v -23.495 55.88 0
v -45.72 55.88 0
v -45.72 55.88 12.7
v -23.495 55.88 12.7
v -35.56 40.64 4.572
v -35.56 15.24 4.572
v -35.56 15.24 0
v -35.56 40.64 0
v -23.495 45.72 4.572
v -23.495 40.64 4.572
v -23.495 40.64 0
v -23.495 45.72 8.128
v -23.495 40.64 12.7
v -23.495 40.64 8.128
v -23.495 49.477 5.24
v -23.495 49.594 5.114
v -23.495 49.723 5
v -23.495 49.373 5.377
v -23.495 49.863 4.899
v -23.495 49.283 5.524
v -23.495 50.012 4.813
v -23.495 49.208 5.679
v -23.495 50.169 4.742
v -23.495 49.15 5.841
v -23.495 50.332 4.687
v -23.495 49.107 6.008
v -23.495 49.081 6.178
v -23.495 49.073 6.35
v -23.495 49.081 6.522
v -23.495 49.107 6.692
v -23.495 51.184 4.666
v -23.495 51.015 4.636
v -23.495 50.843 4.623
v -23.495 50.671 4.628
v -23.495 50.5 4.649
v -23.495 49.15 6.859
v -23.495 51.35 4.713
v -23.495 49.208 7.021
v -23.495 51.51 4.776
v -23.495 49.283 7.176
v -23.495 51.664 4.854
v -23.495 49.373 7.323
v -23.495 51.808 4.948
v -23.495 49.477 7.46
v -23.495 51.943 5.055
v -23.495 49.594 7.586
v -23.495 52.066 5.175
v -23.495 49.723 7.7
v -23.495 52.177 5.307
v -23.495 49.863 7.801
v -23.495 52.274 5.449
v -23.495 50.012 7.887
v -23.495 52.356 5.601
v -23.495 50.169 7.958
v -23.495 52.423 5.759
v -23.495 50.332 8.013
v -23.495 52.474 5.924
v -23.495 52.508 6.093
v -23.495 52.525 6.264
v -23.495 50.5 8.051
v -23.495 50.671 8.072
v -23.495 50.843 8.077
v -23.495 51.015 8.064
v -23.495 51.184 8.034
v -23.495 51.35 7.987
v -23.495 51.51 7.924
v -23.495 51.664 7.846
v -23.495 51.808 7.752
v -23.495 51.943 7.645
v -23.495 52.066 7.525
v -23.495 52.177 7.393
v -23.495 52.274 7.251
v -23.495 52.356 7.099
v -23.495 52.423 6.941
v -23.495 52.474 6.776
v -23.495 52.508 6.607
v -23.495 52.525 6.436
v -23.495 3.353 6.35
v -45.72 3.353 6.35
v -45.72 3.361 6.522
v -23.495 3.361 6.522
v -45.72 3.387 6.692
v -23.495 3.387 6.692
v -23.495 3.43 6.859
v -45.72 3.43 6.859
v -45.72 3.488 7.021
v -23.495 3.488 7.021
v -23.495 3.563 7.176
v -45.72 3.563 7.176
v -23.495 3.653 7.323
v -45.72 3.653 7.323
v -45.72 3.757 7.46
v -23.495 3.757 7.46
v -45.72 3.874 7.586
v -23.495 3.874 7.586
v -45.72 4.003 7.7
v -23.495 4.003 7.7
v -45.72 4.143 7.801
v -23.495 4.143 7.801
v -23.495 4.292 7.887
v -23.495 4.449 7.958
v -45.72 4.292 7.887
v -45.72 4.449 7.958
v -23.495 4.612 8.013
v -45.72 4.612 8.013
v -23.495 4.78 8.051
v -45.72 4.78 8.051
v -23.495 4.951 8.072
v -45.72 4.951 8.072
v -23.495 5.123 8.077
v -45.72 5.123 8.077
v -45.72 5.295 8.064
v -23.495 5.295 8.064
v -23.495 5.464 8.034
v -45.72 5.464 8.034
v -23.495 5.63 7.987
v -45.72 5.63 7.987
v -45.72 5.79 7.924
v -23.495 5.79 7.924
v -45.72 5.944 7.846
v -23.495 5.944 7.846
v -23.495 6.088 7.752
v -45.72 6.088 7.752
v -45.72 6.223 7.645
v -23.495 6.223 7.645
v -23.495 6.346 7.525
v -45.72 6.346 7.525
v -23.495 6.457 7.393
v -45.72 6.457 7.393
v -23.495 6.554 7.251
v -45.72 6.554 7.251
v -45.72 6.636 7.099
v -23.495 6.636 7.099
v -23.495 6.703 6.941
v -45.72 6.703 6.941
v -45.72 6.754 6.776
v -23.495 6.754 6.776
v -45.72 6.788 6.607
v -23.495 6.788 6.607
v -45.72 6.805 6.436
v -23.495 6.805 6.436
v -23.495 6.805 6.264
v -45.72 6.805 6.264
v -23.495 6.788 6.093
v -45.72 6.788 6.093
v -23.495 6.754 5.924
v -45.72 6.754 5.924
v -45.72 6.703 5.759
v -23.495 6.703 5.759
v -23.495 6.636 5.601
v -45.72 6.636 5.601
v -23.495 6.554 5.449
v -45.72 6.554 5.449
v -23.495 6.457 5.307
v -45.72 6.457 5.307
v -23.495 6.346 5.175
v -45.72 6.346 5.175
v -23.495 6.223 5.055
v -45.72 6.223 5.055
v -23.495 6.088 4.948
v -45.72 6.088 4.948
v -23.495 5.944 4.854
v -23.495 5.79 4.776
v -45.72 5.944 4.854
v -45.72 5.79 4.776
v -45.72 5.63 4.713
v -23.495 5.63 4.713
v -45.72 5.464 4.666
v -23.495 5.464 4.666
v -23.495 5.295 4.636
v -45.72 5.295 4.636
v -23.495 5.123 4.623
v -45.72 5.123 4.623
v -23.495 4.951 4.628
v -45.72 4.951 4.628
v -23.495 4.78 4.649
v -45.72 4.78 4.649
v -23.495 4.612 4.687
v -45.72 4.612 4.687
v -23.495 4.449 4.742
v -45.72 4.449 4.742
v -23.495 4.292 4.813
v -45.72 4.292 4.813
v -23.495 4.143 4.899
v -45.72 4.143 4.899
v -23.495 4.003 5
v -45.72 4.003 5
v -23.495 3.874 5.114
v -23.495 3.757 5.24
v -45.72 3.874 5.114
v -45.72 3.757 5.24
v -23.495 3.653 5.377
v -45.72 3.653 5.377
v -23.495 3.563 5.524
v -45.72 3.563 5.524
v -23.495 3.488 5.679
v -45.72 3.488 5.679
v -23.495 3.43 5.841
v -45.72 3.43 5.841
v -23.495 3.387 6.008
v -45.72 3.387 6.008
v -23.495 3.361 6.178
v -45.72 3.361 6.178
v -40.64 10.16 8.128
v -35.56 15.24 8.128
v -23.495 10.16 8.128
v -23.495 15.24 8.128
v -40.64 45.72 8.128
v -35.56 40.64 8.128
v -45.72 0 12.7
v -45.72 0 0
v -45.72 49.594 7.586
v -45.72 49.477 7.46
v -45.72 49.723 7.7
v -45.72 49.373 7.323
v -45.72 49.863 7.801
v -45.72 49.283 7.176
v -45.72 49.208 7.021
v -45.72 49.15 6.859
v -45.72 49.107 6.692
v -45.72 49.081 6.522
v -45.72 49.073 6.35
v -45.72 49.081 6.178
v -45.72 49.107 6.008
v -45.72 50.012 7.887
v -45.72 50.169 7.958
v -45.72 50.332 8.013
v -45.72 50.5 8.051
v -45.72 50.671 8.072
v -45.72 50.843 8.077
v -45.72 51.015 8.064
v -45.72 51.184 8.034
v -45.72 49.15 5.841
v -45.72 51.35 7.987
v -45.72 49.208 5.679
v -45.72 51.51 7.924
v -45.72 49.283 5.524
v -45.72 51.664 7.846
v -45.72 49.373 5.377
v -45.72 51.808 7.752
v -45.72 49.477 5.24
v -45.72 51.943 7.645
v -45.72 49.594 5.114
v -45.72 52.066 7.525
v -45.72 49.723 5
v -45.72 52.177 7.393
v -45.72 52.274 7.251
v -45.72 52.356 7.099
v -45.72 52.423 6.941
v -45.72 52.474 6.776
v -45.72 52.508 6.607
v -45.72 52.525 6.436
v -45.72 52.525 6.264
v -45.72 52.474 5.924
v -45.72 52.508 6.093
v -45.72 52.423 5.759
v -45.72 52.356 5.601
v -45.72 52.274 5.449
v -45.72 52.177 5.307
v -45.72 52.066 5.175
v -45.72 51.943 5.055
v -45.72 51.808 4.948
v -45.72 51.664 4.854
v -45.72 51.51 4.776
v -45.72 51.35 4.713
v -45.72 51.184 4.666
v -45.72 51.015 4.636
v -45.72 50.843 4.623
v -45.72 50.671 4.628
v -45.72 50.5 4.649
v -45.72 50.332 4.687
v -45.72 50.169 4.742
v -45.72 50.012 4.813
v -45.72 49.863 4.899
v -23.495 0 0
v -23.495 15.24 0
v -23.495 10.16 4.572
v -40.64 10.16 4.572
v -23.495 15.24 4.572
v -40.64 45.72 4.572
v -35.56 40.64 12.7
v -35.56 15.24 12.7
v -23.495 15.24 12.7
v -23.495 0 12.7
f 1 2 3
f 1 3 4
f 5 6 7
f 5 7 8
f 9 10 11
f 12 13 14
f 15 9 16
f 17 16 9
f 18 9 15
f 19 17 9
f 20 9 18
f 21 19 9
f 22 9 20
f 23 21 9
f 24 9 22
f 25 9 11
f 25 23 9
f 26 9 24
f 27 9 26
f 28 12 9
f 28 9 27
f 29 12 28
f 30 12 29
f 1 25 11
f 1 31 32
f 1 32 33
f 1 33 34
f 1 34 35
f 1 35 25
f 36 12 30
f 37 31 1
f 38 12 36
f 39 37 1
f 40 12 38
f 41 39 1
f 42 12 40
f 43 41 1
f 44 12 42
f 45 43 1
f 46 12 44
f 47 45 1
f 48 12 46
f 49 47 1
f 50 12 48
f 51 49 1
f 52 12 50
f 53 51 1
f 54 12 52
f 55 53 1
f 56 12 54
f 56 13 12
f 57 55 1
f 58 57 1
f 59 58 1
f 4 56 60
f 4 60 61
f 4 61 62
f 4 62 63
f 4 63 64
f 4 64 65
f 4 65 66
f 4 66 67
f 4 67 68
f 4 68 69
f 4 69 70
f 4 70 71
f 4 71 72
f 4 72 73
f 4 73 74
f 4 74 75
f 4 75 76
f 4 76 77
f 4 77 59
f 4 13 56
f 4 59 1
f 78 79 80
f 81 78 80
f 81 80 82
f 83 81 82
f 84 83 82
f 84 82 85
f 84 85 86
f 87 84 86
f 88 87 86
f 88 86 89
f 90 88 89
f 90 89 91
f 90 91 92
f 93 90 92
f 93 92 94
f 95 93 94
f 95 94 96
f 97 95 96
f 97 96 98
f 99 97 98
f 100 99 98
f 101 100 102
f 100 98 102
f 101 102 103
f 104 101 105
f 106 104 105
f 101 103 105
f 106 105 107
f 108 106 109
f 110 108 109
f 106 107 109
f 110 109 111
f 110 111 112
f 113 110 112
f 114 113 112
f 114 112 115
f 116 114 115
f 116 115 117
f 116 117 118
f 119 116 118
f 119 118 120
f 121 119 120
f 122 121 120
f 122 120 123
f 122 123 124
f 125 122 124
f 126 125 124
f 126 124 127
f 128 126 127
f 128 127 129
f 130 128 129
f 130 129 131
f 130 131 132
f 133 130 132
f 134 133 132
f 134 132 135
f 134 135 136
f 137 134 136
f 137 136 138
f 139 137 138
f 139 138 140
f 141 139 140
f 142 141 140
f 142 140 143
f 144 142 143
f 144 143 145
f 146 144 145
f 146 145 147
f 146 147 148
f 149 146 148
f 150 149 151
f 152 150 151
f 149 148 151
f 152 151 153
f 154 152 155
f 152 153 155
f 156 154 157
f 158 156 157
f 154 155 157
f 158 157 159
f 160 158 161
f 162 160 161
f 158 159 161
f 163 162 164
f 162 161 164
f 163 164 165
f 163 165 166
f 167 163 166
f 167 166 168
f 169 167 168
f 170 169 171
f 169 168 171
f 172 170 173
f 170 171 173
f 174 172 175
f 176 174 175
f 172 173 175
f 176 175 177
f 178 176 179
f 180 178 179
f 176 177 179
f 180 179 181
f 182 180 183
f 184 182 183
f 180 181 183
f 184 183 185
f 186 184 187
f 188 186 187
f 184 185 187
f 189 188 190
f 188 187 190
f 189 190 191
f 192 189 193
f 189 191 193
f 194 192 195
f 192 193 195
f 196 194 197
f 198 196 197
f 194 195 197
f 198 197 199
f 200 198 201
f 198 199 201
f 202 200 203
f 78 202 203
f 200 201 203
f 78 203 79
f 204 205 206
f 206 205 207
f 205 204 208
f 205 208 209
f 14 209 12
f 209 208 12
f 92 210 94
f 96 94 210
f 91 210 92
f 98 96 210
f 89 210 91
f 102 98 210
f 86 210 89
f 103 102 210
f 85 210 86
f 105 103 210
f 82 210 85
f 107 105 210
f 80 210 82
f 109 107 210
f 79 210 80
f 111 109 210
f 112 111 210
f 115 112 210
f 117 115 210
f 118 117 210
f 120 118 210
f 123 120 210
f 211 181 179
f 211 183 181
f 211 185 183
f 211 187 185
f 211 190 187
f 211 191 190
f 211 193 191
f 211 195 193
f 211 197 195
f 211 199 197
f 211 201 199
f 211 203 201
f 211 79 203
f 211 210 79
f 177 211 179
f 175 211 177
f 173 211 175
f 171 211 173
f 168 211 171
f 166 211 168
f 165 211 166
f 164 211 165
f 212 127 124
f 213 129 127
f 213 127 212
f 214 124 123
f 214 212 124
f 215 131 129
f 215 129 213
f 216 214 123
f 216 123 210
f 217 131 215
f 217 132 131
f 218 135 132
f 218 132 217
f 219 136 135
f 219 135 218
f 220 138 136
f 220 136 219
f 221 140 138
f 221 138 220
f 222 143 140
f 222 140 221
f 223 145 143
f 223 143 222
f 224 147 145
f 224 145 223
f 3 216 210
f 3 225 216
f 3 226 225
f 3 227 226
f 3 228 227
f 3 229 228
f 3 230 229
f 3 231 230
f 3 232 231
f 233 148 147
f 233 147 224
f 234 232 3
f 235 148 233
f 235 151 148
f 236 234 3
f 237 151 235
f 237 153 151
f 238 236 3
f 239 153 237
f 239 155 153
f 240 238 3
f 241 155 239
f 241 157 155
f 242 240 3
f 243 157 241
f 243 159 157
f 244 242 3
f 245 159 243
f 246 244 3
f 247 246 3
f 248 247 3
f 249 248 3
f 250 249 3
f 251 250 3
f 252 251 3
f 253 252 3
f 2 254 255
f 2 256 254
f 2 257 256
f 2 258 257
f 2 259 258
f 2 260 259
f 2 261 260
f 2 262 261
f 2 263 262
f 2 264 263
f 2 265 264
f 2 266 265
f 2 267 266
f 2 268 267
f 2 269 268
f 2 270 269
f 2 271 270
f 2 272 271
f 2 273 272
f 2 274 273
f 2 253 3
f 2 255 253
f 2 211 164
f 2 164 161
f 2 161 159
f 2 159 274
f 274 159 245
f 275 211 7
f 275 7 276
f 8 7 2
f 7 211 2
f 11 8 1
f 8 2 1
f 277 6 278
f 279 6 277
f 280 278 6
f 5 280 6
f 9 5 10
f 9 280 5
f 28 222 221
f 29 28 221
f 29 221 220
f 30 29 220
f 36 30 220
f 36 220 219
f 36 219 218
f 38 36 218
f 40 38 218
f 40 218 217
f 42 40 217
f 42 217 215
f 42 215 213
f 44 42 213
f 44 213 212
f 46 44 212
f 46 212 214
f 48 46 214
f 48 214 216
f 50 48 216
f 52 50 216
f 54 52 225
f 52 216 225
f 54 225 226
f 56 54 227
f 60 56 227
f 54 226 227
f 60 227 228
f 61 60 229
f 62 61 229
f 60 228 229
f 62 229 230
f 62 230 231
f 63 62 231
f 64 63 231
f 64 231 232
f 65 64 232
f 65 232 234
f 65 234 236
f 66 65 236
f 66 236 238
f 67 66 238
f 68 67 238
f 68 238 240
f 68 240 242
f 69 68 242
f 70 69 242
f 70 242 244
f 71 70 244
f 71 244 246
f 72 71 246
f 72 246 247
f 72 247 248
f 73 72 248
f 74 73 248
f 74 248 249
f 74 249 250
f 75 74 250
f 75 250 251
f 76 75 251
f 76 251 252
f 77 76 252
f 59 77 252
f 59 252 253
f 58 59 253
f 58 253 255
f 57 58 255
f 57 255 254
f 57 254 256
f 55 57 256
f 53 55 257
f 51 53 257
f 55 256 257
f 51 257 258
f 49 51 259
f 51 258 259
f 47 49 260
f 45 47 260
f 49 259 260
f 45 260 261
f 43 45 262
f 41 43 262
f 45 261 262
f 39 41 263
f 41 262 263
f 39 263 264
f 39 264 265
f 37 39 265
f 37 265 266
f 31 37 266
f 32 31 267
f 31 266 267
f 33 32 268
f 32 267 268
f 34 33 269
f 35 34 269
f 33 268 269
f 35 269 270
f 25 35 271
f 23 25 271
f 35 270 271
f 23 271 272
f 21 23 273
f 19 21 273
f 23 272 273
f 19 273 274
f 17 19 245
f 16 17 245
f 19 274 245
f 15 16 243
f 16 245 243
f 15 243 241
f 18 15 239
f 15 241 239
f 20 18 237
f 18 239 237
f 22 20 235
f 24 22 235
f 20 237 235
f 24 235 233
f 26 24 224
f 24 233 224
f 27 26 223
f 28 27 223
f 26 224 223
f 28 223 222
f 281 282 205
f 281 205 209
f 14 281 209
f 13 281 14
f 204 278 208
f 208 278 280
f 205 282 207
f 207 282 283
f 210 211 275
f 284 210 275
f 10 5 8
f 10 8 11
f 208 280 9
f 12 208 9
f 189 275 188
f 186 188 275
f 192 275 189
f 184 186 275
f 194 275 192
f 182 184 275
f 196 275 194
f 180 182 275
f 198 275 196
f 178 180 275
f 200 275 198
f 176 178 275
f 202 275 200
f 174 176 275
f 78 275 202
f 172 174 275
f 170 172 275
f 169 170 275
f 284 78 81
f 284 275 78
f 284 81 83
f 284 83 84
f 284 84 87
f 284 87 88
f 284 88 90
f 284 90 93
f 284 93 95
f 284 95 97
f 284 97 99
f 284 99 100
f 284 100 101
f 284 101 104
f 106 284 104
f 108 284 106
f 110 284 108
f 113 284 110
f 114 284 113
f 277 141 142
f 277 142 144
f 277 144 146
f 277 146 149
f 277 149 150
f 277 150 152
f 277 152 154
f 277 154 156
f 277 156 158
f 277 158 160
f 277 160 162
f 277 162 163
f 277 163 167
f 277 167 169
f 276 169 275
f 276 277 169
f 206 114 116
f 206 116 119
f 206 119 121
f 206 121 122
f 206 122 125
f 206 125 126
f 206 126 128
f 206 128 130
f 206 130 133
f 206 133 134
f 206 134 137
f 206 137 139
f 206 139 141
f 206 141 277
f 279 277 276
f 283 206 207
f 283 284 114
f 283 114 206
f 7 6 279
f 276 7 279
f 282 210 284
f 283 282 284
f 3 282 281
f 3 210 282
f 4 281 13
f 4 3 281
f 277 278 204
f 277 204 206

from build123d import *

# Parameters (mm, degrees)
SKETCH2_W           = 45.72
SKETCH2_H           = 55.88
SKETCH2_W_2         = 35.56
SKETCH2_H_2         = 35.56
BOSS_EXTRUDE1_DEPTH = 12.7
SKETCH3_W           = 35.56
SKETCH3_H           = 35.56
BOSS_EXTRUDE2_DEPTH = 4.572
SKETCH4_W           = 35.56
SKETCH4_H           = 35.56
BOSS_EXTRUDE3_DEPTH = 4.572
SKETCH5_W           = 25.4
SKETCH5_H           = 25.4
CUT_EXTRUDE1_DEPTH  = 74.308818023
SKETCH6_R           = 1.7272
CUT_EXTRUDE2_DEPTH  = 74.308818023
SKETCH7_R           = 1.7272
CUT_EXTRUDE3_DEPTH  = 74.308818023
SKETCH8_W           = 1.27
SKETCH8_H           = 55.88
CUT_EXTRUDE4_DEPTH  = 74.308818023


with BuildPart() as part:
    # Sketch2 → Boss-Extrude1 (new body)
    with BuildSketch(Plane.XY):
        with Locations((-22.86, 27.94)):
            Rectangle(SKETCH2_W, SKETCH2_H)
        with Locations((-22.86, 27.94)):
            Rectangle(SKETCH2_W_2, SKETCH2_H_2, mode=Mode.SUBTRACT)
    extrude(amount=BOSS_EXTRUDE1_DEPTH)

    # Sketch3 → Boss-Extrude2 (add)
    with BuildSketch(Plane.XY):
        with Locations((-22.86, 27.94)):
            Rectangle(SKETCH3_W, SKETCH3_H)
    extrude(amount=BOSS_EXTRUDE2_DEPTH)

    # Sketch4 → Boss-Extrude3 (add)
    with BuildSketch(Plane.XY.offset(12.7)):
        with Locations((-22.86, 27.94)):
            Rectangle(SKETCH4_W, SKETCH4_H)
    extrude(amount=-BOSS_EXTRUDE3_DEPTH)

    # Sketch5 → Cut-Extrude1 (cut, through all)
    with BuildSketch(Plane.XY.offset(12.7)):
        with Locations((-22.86, 27.94)):
            Rectangle(SKETCH5_W, SKETCH5_H)
    extrude(amount=-CUT_EXTRUDE1_DEPTH, mode=Mode.SUBTRACT)

    # Sketch6 → Cut-Extrude2 (cut, through all)
    with BuildSketch(Plane.ZY.offset(45.72)):
        with Locations(Location((6.35, 50.8, 0), (0, 0, 270))):
            Circle(SKETCH6_R)
    extrude(amount=-CUT_EXTRUDE2_DEPTH, mode=Mode.SUBTRACT)

    # Sketch7 → Cut-Extrude3 (cut, through all)
    with BuildSketch(Plane.ZY.offset(45.72)):
        with Locations(Location((6.35, 5.08, 0), (0, 0, 270))):
            Circle(SKETCH7_R)
    extrude(amount=-CUT_EXTRUDE3_DEPTH, mode=Mode.SUBTRACT)

    # Sketch8 → Cut-Extrude4 (cut, through all)
    with BuildSketch(Plane.XY.offset(12.7)):
        with Locations((-22.86, 27.94)):
            Rectangle(SKETCH8_W, SKETCH8_H)
    extrude(amount=-CUT_EXTRUDE4_DEPTH, mode=Mode.SUBTRACT)


with BuildPart() as body_2:
    # of the pieces the cut leaves, the one that is kept (cut_extrude4_keep)
    add(part.part.solids().sort_by_distance((-45.72, 55.88, 0))[0])


solid = body_2.part
